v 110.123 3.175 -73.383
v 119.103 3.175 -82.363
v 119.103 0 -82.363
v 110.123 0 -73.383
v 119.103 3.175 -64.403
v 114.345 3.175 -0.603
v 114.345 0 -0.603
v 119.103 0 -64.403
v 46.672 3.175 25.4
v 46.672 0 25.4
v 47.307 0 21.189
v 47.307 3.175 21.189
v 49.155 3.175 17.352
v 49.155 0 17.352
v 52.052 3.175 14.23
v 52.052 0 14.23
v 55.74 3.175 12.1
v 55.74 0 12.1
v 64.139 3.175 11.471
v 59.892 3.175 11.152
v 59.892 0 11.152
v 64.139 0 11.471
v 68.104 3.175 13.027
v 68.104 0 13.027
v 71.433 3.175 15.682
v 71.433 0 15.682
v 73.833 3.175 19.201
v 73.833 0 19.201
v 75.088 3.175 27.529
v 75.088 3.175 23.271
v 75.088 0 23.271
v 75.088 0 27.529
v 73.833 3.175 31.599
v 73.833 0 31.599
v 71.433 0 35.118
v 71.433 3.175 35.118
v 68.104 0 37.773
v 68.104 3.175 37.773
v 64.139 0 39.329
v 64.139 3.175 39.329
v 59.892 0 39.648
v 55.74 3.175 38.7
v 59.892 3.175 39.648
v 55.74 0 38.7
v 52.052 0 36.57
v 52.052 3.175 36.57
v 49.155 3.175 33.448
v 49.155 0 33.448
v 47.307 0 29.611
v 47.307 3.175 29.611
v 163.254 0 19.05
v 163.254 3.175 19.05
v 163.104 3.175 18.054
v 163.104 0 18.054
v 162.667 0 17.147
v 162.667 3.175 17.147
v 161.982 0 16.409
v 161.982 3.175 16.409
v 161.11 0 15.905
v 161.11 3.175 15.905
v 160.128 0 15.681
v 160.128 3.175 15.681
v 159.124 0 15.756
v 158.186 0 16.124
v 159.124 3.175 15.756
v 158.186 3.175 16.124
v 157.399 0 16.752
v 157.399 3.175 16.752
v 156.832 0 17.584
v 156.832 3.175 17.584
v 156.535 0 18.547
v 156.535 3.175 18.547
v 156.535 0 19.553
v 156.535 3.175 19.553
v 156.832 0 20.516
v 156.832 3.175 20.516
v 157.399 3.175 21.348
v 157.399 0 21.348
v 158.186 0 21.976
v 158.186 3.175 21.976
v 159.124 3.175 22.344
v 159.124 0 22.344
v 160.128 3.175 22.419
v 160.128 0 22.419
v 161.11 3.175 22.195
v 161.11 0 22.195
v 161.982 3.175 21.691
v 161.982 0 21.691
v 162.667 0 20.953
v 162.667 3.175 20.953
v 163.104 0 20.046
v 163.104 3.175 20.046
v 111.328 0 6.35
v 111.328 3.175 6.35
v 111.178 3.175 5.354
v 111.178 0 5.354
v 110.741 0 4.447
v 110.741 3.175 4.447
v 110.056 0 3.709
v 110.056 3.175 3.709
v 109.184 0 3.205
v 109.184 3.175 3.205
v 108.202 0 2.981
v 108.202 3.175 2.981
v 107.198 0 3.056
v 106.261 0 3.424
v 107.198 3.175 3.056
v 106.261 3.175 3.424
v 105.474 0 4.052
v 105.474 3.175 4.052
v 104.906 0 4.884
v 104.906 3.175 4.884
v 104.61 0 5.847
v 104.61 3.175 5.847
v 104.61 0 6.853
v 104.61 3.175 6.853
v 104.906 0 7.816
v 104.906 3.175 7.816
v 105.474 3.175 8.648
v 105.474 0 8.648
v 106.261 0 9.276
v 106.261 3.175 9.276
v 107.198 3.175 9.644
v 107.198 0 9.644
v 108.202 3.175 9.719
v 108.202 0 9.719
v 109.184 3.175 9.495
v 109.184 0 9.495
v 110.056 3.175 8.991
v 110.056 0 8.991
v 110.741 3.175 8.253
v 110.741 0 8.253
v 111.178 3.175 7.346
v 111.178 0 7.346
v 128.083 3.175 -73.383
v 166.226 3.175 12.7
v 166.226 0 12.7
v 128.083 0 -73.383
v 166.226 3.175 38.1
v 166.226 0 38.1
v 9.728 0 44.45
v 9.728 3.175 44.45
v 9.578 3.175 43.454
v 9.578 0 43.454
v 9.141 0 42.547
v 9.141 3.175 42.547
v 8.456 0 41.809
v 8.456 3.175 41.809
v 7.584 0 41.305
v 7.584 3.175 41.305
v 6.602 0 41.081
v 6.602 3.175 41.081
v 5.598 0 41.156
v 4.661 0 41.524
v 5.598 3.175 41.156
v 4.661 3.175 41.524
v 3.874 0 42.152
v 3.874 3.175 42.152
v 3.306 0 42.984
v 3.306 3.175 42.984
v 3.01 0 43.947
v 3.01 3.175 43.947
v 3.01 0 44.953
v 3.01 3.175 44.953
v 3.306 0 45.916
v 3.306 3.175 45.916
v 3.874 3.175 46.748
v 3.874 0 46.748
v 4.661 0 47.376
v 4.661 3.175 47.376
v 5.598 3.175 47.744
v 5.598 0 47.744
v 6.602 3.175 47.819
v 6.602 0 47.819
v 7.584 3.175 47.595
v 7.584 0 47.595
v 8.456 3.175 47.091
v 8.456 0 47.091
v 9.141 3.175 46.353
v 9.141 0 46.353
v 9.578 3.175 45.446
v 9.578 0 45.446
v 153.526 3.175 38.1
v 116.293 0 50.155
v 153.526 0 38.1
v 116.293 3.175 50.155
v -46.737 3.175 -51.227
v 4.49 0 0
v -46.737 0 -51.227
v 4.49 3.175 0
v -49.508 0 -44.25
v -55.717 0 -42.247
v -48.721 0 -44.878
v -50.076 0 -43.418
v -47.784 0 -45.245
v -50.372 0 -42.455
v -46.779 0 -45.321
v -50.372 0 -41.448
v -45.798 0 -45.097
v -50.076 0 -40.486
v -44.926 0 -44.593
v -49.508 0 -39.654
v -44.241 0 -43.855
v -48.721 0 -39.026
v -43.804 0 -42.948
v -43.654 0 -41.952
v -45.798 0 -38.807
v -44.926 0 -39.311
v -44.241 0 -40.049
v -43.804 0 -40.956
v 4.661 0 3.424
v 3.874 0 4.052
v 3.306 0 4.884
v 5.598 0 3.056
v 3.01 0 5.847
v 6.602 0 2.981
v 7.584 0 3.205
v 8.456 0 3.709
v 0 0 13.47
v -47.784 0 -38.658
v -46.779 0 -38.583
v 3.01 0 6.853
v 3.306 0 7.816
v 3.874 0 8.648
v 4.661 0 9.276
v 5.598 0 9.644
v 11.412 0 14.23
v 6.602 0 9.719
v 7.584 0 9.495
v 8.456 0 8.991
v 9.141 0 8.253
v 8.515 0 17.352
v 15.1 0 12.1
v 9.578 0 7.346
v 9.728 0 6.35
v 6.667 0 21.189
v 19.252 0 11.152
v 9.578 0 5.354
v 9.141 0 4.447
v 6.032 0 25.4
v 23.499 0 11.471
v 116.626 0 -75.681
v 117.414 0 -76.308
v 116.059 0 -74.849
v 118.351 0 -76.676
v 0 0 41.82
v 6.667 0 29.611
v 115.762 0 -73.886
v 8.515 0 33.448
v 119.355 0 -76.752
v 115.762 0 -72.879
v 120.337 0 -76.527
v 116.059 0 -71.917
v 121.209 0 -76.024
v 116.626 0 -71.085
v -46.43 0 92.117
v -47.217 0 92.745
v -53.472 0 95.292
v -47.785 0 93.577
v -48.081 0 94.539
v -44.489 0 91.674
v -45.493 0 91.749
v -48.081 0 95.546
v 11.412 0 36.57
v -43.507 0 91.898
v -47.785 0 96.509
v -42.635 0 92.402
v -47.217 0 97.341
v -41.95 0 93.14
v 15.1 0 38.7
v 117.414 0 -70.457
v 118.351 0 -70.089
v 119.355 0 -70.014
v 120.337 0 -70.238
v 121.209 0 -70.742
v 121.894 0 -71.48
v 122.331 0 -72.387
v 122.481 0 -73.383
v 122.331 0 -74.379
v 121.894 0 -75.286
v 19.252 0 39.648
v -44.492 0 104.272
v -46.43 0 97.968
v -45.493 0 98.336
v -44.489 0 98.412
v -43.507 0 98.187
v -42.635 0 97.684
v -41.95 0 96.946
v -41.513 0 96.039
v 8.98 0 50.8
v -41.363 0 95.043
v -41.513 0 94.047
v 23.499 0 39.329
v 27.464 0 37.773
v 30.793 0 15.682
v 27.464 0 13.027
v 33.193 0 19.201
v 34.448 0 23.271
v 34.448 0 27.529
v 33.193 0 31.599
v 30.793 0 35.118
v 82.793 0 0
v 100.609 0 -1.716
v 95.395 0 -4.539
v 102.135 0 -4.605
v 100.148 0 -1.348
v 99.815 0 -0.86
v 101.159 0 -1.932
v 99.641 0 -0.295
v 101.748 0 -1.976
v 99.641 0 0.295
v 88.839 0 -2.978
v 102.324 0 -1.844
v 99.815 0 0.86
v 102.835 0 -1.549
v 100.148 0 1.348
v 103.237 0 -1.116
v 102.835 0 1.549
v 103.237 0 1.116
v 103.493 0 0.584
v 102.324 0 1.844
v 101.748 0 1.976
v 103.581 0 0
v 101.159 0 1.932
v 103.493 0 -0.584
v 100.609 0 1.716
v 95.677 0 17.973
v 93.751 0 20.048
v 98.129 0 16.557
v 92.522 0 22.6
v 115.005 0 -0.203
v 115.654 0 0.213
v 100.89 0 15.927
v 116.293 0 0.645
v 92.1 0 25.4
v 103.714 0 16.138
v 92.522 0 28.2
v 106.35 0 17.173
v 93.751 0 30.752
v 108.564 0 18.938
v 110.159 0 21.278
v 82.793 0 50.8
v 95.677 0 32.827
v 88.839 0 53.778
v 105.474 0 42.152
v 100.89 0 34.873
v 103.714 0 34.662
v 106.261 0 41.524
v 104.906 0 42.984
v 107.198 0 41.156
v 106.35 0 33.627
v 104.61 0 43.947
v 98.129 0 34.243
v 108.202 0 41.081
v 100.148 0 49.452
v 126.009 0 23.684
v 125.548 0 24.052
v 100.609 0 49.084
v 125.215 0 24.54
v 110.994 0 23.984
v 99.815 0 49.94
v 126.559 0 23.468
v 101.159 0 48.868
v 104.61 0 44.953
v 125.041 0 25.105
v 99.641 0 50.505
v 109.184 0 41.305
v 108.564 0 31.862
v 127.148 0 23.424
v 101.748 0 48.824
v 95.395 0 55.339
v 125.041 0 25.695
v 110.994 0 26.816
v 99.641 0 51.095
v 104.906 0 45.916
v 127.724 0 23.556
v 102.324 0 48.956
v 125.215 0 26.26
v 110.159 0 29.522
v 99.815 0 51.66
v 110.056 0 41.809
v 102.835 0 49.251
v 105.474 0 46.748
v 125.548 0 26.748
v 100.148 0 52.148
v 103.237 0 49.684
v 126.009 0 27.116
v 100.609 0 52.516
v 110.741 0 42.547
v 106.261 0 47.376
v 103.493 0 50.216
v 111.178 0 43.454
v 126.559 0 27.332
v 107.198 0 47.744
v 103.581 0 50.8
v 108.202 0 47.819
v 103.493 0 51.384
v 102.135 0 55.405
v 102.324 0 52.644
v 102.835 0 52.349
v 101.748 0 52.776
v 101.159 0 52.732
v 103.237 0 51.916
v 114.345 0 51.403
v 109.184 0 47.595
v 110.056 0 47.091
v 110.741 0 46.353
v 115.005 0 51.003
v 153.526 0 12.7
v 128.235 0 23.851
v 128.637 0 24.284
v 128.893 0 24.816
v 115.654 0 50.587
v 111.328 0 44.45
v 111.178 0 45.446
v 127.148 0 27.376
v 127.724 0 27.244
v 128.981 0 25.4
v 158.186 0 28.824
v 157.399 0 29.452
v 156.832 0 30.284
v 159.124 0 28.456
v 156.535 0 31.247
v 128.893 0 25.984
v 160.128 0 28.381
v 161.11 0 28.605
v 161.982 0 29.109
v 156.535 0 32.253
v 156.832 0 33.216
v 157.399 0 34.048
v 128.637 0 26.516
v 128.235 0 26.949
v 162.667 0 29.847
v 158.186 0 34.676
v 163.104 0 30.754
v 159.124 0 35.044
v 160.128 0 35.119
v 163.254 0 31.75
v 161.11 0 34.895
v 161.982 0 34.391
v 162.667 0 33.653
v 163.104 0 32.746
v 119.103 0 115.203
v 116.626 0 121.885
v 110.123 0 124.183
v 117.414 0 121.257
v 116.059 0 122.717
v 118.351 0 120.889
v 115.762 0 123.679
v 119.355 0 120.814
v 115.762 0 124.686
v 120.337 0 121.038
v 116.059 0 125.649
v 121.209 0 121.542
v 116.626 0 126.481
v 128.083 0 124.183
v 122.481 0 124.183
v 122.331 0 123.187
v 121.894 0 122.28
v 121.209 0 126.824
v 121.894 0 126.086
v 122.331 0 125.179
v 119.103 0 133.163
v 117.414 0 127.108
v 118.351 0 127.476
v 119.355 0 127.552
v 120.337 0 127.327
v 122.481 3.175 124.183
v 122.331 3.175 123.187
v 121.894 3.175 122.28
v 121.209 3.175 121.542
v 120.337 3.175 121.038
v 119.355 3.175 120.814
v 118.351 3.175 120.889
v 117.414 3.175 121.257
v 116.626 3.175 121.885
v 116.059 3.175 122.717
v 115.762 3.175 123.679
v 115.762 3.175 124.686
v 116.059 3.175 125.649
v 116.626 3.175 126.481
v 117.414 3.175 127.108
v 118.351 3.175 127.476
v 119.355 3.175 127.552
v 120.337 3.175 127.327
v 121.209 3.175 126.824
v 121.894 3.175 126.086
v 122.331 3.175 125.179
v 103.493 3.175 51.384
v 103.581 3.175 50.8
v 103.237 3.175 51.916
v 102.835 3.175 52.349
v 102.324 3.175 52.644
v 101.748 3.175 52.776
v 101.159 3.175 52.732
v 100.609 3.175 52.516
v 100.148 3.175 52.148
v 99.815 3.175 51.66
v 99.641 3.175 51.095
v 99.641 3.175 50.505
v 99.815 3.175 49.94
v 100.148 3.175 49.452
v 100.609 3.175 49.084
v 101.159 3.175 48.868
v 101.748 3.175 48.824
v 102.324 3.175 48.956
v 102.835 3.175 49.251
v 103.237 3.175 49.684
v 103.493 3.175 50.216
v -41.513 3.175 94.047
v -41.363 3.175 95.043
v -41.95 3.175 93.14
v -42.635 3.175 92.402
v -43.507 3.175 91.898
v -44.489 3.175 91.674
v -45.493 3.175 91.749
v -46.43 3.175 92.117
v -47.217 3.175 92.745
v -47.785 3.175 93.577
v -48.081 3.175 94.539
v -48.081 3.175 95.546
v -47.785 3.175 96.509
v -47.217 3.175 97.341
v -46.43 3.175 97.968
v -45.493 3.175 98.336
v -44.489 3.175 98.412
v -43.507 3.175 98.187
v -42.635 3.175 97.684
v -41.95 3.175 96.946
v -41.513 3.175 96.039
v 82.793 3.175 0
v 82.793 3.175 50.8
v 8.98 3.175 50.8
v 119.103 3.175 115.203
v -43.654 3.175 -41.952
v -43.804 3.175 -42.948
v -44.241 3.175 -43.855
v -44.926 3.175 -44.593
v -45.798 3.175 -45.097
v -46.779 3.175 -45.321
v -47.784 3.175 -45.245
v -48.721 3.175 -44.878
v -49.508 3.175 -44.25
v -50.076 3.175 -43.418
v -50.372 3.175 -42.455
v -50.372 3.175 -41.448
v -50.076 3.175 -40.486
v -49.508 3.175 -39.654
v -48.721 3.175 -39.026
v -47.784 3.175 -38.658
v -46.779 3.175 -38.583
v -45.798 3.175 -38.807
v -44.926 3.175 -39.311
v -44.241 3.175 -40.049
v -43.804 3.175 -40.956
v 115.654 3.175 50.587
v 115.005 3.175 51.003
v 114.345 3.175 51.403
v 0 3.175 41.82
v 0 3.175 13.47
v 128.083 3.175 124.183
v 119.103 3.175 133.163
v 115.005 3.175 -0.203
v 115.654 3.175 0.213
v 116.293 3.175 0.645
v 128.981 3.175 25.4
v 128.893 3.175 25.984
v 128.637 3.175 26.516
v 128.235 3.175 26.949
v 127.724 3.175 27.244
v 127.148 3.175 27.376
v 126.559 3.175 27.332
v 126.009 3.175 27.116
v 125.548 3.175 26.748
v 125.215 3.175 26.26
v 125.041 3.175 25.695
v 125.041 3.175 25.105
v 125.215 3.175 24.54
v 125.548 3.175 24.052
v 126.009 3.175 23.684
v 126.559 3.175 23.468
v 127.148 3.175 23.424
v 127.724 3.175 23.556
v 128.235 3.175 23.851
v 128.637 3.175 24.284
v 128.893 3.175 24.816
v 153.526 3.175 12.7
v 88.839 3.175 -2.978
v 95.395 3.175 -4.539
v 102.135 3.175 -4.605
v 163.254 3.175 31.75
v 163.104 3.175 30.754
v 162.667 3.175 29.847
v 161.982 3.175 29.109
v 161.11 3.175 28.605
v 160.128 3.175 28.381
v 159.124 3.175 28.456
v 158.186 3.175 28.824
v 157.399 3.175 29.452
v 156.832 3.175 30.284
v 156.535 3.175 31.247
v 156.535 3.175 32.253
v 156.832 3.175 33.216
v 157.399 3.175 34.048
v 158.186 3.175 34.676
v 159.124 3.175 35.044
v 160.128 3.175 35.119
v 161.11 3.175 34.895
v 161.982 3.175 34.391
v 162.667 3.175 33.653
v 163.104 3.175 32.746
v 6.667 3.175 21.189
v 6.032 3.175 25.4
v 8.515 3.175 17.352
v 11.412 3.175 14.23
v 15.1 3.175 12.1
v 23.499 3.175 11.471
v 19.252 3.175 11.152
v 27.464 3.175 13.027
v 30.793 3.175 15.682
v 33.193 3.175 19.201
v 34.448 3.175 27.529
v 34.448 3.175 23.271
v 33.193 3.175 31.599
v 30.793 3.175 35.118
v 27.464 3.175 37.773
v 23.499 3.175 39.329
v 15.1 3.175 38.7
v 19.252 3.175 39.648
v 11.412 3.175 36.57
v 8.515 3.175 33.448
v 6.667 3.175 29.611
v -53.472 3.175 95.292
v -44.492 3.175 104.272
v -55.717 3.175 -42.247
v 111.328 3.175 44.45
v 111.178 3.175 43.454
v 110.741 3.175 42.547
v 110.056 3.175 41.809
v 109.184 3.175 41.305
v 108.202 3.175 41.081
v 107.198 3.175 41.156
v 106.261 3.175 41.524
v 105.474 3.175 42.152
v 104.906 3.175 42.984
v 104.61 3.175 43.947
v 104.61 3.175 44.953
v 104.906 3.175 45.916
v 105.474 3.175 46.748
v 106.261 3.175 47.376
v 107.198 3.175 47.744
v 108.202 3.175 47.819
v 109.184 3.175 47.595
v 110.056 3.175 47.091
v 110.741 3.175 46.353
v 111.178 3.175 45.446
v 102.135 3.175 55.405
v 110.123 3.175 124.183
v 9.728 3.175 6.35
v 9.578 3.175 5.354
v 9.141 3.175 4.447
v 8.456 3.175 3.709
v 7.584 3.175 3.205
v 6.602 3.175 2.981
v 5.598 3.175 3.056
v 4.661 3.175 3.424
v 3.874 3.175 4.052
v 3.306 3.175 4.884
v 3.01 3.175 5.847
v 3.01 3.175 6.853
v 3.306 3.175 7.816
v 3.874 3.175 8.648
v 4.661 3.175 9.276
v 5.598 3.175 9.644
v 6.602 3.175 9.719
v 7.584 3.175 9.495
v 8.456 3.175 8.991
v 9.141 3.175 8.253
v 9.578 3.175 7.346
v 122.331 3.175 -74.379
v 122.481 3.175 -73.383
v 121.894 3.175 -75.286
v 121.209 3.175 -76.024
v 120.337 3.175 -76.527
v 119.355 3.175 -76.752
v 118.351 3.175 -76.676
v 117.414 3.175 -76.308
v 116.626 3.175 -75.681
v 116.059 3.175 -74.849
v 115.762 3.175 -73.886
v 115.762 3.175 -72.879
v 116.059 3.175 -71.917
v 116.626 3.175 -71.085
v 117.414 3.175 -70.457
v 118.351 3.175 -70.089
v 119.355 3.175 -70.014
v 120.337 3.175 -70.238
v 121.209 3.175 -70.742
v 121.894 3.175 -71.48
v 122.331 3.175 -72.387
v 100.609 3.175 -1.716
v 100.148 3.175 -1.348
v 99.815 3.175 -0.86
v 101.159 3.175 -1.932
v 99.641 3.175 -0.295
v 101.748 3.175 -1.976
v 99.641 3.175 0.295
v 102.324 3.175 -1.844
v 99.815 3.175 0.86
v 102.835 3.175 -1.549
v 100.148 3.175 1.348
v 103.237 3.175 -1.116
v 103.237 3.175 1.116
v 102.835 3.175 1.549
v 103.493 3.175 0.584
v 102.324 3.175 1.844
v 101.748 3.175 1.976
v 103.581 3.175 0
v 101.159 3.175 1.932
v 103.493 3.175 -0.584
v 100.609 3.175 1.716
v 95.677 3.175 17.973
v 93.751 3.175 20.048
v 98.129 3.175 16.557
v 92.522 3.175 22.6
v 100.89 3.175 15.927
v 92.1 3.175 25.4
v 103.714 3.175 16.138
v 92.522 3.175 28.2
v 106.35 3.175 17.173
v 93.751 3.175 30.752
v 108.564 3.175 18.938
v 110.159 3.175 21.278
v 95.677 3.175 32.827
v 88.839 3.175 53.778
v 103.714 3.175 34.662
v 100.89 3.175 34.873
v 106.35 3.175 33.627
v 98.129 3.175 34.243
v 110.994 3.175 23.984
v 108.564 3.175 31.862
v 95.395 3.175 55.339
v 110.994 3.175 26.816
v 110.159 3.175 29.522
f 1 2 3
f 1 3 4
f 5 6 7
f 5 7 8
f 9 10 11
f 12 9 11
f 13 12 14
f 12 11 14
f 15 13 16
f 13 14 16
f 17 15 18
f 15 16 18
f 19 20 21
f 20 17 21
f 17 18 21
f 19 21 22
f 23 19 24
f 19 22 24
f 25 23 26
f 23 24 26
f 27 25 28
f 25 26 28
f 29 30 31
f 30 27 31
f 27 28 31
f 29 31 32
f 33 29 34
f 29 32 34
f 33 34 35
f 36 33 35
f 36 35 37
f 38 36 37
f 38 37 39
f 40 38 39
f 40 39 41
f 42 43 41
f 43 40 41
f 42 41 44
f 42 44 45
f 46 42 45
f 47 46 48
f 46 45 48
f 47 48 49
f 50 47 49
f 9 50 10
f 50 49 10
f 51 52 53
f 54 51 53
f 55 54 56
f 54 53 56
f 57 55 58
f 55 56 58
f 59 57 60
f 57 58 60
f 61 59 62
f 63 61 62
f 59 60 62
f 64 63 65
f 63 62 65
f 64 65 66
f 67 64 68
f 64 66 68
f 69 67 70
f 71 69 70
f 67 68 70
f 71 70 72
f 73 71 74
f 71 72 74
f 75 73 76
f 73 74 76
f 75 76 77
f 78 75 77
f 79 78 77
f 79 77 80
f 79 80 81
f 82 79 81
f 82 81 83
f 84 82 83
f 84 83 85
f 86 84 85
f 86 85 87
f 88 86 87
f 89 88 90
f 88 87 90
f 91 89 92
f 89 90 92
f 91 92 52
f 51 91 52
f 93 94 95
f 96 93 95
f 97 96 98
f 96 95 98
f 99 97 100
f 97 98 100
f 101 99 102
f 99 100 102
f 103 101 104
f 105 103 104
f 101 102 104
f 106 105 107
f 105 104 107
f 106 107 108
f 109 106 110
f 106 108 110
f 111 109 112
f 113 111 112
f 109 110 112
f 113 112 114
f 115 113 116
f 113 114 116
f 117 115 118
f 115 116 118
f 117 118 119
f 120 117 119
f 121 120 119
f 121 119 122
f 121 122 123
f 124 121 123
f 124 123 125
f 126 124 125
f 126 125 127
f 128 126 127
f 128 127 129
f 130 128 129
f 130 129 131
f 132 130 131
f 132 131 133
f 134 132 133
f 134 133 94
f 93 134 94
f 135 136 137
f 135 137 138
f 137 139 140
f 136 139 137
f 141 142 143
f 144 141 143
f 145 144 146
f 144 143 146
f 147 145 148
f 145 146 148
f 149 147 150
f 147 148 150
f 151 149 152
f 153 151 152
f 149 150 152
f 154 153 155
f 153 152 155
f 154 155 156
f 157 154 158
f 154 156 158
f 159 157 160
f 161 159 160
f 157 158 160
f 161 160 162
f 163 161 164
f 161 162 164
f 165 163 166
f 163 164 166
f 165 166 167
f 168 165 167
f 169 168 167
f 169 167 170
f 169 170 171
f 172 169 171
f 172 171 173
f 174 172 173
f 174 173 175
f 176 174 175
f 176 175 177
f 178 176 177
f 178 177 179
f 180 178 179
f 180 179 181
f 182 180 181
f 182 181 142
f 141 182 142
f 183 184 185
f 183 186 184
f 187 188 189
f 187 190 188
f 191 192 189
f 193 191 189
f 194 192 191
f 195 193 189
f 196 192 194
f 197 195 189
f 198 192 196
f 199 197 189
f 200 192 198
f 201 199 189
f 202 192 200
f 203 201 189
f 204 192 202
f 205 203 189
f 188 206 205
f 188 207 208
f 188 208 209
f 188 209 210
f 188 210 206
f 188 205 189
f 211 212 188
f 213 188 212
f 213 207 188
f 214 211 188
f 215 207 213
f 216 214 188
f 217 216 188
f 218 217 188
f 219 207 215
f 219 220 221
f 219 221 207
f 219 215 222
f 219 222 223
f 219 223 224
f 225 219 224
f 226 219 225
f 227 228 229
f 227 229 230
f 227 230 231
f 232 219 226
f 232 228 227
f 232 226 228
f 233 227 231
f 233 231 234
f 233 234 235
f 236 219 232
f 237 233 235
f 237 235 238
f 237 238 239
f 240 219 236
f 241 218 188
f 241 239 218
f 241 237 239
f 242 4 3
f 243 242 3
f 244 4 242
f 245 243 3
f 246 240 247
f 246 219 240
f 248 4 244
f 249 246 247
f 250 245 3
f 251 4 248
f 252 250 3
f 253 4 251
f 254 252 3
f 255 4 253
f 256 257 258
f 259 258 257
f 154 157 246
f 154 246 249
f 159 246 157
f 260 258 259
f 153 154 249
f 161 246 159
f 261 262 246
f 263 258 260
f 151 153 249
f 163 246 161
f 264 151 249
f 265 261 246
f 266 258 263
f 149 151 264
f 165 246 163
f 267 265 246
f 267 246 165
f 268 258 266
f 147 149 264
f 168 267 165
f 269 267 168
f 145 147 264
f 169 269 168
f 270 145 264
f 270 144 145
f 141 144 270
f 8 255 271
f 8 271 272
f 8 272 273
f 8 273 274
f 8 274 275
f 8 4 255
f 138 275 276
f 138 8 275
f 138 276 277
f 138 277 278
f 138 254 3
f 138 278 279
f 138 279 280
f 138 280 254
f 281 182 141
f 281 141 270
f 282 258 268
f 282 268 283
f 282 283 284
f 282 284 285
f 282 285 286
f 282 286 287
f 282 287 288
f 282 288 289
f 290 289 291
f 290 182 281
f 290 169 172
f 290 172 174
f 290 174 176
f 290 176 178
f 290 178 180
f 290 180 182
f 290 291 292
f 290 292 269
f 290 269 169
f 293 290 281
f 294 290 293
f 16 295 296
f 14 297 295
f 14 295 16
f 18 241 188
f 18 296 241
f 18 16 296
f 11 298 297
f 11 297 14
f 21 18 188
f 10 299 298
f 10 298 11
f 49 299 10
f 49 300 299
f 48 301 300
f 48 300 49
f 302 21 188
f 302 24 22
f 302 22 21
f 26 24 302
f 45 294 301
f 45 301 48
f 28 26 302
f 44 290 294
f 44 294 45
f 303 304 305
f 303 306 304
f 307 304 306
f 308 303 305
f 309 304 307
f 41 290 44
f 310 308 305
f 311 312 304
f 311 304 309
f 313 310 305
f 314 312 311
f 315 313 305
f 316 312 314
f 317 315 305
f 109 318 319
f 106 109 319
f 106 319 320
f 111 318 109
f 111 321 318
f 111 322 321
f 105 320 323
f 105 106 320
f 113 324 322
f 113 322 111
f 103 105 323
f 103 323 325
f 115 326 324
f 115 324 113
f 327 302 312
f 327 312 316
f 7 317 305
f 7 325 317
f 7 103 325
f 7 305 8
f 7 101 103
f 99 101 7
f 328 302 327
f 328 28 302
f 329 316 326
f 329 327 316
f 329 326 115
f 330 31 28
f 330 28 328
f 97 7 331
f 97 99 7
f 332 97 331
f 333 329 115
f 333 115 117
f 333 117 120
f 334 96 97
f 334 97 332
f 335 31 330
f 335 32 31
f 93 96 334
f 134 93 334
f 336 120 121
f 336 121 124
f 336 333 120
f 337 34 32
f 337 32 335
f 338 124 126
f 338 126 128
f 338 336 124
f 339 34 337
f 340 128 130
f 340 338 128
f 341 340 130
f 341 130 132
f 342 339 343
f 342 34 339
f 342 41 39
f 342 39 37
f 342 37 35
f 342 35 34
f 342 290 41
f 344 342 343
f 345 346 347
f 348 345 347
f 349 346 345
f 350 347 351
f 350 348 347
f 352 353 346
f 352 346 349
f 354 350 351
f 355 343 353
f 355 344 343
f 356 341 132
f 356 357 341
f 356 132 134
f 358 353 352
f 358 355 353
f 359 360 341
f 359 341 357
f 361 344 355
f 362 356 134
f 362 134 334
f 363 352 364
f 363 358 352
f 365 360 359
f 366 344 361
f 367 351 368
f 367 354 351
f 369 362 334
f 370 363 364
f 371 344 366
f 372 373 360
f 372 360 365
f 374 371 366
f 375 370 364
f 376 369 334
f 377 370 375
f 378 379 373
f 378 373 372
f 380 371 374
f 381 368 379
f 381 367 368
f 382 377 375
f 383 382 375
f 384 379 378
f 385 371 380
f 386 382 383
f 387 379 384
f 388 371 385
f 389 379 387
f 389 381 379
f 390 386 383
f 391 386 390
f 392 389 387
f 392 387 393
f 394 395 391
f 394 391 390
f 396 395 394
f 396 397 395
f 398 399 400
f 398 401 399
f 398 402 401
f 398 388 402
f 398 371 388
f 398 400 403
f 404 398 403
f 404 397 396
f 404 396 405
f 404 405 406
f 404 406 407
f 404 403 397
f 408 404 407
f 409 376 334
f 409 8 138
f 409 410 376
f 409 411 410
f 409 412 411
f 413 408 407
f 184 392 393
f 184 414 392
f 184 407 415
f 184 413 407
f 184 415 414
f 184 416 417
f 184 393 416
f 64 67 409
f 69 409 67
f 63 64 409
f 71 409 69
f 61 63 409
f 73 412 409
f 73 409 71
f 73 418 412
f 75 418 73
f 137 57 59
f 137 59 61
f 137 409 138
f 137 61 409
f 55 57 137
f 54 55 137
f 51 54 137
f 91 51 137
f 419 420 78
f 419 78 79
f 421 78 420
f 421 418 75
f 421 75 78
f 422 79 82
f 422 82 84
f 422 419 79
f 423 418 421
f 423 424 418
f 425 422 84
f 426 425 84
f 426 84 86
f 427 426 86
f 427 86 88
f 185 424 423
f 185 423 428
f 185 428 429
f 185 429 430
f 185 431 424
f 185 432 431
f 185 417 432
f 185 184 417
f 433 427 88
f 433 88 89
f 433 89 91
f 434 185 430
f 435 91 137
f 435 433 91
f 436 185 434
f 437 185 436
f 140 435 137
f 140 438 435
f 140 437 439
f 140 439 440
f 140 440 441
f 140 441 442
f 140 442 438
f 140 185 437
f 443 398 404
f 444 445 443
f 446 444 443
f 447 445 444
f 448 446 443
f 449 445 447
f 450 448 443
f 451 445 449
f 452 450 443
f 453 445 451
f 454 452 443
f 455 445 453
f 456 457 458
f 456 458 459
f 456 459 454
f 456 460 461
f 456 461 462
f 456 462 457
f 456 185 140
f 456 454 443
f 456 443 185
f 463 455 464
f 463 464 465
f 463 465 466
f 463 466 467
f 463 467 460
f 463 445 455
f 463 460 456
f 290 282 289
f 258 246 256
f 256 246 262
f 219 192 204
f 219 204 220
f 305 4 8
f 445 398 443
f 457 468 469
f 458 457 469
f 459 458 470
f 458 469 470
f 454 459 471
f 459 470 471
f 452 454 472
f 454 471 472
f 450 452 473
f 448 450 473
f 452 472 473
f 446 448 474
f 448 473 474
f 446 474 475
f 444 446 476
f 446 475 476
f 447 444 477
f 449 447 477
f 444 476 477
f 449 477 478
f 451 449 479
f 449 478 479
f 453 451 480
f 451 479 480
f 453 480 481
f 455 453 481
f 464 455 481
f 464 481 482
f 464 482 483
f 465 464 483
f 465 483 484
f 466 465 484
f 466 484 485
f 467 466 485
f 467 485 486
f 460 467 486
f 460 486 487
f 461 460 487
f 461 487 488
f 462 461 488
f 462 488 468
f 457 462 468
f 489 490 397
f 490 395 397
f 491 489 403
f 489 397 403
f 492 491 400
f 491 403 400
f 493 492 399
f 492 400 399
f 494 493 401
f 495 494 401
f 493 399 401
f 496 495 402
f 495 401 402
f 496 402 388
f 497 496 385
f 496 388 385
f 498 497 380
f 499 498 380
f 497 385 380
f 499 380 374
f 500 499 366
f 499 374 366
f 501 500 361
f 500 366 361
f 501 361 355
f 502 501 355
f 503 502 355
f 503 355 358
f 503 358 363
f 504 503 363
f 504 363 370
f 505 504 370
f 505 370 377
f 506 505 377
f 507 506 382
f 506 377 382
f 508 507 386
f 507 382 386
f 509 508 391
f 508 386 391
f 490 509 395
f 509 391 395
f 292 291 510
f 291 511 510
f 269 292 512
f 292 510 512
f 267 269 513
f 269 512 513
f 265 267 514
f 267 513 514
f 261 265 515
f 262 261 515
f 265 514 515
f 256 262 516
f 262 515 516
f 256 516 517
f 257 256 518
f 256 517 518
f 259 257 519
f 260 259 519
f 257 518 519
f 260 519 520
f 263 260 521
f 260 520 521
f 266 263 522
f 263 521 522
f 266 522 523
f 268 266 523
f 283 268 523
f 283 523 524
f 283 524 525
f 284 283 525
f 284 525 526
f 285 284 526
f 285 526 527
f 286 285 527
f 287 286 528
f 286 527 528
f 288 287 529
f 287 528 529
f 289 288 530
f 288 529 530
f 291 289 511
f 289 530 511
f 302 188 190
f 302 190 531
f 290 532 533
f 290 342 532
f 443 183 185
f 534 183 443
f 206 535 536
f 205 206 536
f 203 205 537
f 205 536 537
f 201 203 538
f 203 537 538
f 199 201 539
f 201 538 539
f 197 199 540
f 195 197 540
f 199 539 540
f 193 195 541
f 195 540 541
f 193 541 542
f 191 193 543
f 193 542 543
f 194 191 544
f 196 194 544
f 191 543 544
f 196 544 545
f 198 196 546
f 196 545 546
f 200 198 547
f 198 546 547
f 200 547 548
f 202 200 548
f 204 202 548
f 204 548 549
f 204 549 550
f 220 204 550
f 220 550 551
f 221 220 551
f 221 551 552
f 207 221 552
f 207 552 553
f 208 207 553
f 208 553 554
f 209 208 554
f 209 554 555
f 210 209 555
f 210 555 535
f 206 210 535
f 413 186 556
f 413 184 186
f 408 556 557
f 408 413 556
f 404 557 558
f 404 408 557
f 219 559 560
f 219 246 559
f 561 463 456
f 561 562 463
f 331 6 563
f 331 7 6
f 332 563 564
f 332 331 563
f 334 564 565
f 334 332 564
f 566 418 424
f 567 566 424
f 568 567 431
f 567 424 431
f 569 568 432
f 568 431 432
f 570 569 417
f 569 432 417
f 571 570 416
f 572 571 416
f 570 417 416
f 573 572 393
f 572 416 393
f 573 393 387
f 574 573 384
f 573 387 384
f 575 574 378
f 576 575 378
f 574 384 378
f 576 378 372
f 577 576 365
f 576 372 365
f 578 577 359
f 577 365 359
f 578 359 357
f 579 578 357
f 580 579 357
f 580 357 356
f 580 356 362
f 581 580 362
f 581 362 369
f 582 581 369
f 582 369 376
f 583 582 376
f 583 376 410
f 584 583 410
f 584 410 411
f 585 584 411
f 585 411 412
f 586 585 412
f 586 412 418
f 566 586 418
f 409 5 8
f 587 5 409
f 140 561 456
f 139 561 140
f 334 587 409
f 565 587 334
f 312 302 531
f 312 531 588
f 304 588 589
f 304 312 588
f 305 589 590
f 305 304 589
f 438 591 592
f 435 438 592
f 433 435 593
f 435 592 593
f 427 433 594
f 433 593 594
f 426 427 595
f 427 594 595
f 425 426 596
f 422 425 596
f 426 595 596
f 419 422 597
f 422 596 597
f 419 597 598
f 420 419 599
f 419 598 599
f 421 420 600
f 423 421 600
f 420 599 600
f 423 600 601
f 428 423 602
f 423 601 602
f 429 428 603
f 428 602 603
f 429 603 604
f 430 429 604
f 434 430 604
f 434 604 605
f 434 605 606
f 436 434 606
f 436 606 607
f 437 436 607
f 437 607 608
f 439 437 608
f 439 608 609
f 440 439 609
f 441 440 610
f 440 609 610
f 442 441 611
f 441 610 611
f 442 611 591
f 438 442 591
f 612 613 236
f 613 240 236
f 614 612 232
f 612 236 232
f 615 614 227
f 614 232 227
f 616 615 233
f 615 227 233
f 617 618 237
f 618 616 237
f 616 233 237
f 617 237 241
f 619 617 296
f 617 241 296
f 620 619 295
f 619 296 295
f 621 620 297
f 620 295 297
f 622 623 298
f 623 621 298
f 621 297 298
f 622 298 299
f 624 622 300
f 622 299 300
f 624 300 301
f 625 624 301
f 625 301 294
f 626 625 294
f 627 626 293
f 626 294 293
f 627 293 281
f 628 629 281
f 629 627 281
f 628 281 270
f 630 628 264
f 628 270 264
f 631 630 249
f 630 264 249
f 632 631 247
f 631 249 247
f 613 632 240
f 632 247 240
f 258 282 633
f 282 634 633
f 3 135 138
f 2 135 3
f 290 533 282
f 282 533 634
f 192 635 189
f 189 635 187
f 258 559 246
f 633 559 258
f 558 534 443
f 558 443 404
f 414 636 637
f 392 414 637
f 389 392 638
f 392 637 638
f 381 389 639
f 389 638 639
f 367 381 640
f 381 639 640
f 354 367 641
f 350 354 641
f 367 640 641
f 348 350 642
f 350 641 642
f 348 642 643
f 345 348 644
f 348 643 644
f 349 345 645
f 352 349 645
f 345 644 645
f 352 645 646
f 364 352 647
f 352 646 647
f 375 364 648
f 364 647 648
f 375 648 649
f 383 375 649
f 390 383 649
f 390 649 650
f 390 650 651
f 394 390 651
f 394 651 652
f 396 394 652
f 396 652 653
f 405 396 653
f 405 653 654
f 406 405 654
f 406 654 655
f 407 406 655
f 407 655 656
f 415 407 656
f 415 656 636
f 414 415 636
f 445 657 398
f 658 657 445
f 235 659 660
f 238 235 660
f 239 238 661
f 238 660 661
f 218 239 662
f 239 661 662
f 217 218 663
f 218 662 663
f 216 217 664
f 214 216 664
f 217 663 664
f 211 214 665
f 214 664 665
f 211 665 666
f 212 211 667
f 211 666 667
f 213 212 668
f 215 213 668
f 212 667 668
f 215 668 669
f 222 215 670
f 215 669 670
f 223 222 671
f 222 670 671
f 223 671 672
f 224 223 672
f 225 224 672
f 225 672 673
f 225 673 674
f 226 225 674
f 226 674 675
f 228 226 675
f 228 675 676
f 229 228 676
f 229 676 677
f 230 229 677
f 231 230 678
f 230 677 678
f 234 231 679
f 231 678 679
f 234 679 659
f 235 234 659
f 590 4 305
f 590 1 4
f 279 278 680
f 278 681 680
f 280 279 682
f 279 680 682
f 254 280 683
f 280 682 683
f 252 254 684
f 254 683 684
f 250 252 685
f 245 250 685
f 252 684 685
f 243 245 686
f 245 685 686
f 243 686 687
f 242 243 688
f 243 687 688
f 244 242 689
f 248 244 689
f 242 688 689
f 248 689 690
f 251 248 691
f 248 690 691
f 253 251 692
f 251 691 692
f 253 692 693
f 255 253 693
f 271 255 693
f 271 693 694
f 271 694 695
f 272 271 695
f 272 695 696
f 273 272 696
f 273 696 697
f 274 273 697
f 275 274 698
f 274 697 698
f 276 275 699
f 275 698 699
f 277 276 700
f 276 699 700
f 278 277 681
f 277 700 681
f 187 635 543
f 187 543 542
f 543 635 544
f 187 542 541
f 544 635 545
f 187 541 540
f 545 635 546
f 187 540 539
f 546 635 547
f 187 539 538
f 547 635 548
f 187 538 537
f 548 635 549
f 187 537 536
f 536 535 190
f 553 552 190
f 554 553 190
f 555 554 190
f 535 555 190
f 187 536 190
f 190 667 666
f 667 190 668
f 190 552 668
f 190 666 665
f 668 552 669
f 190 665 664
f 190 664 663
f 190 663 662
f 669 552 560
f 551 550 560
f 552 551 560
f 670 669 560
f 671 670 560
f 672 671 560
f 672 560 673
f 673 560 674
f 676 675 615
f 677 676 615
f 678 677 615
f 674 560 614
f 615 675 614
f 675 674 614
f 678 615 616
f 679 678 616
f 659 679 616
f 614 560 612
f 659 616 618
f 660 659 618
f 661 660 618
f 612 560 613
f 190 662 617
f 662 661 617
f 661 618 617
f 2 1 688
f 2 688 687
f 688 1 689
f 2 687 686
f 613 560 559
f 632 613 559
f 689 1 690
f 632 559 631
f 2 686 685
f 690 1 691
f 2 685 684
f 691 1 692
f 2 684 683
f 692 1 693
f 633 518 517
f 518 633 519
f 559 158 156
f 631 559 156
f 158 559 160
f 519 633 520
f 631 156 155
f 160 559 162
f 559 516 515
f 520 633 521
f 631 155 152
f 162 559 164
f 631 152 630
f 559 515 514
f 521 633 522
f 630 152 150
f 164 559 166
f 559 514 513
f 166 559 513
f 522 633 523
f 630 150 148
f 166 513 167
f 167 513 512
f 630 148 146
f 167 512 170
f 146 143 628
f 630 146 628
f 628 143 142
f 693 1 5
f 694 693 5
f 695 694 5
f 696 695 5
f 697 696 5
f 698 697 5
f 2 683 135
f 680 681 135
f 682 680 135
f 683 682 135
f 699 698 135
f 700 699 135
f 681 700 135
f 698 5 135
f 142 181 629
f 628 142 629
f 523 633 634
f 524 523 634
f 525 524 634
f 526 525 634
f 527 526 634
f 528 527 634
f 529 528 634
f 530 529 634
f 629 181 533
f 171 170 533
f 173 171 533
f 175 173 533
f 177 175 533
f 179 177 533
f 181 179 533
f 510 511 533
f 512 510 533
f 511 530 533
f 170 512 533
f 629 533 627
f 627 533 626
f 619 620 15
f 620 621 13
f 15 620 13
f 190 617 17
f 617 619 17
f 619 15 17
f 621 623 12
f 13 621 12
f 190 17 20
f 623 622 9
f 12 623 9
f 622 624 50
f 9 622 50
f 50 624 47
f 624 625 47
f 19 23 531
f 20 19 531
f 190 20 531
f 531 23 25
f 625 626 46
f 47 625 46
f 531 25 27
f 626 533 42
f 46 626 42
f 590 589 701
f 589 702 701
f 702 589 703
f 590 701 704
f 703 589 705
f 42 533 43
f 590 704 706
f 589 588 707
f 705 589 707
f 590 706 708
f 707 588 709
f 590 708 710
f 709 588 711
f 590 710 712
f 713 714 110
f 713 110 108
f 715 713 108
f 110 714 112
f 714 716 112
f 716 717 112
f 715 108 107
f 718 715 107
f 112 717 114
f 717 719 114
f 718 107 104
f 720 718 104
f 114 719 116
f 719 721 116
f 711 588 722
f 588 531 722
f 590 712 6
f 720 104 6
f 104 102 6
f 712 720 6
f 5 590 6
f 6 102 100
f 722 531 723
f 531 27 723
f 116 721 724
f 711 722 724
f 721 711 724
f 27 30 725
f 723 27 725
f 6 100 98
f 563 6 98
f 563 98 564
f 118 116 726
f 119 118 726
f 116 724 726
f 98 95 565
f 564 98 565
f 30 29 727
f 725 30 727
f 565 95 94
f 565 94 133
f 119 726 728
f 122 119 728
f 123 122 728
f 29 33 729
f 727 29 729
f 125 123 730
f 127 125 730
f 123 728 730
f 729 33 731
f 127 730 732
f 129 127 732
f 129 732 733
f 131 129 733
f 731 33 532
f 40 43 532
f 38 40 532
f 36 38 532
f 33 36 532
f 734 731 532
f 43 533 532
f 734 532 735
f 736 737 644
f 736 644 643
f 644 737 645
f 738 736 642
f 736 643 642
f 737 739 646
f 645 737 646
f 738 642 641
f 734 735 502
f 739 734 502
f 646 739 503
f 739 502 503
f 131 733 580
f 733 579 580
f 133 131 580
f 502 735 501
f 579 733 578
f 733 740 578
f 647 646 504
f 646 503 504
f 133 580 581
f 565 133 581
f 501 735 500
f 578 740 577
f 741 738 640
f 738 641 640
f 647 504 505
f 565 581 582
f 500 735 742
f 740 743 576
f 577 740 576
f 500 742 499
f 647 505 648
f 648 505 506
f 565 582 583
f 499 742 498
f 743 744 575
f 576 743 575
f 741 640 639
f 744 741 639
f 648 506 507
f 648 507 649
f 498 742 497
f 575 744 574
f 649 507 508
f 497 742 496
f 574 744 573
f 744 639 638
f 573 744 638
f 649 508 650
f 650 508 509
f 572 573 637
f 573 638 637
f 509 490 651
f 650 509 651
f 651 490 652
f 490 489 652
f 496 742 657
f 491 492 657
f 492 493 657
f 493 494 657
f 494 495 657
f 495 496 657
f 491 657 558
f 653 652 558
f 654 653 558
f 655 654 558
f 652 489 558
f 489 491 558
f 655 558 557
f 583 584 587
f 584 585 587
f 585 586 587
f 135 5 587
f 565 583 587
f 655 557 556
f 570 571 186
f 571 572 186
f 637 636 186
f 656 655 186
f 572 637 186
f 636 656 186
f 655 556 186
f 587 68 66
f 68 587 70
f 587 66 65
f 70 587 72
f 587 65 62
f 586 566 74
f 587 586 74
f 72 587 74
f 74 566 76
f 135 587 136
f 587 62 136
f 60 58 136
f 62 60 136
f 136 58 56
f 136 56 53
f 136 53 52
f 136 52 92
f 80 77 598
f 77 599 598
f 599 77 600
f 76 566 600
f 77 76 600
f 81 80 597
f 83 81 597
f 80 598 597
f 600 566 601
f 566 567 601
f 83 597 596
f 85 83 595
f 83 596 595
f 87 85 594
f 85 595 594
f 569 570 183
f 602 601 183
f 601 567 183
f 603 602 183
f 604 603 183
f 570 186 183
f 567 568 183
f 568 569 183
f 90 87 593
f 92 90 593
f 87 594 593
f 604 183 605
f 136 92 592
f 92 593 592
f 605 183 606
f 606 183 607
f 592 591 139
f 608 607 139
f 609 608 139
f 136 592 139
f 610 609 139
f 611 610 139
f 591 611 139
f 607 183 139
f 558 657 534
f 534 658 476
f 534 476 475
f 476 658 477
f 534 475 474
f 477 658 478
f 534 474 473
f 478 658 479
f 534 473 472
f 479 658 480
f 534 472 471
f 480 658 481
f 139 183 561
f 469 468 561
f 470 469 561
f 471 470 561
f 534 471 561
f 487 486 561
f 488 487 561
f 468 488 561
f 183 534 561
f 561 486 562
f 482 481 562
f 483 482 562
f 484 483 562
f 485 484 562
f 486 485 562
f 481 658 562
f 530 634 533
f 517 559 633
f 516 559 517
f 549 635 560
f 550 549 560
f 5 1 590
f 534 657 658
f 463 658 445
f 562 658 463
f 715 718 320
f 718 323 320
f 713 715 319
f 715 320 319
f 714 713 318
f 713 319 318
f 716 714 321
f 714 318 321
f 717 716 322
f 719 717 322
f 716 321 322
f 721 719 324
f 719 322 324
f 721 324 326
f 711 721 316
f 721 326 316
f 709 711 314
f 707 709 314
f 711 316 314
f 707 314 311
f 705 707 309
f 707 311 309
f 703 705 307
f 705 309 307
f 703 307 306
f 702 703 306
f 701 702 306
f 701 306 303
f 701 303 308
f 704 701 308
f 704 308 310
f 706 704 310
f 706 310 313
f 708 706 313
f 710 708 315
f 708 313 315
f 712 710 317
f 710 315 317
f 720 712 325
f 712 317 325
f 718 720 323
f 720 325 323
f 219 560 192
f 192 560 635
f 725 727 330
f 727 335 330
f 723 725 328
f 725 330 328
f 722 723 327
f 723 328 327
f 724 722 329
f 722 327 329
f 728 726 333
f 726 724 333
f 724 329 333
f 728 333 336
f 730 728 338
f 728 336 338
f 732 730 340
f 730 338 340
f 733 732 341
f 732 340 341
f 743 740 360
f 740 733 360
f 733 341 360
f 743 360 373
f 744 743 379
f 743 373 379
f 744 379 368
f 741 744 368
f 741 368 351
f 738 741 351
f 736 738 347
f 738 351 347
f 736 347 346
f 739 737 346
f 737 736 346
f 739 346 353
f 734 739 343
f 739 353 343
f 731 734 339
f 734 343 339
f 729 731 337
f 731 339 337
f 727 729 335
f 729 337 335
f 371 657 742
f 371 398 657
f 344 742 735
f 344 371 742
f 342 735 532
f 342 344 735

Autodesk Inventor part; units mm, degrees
ref_plane "YZ Plane" through (0, 0, 0) normal (1, 0, 0) x (0, 1, 0)
ref_plane "XZ Plane" through (0, 0, 0) normal (0, 1, 0) x (-1, 0, 0)
ref_plane "XY Plane" through (0, 0, 0) normal (0, 0, 1) x (1, 0, 0)
sketch "Sketch1" plane through (0, 0, 0) normal (0, 1, 0) x (-1, 0, 0)
  line L0 (0, 0) -> (-114.3, 0)
  line L1 (-114.3, 0) -> (-114.3, 50.8)
  line L2 (-114.3, 50.8) -> (0, 50.8)
  line L3 (0, 50.8) -> (0, 0)
  circle A0 centre (-101.6, 25.4) radius 9.5
  circle A1 centre (-60.96, 25.4) radius 14.2875
  circle A2 centre (-20.32, 25.4) radius 14.2875
  dimension "d3" = 50.8
  dimension "d4" = 19
  dimension "d12" = 28.575
  dimension "d13" = 40.64
  dimension "d14" = 114.3
  dimension "d15" = 28.575
  dimension "d16" = 40.64
  dimension "d56" = 20.32
  dimension "d57" = 25.4
  dimension "d58" = 25.4
  dimension "d59" = 25.4
extrude "Extrusion3" add sketch "Sketch1" along normal blind 3.175
sketch "Sketch2" plane through (0, 3.175, 0) normal (0, 1, 0) x (1, 0, 0)
  line L0 (114.3, 0) -> (0, 0) projected
  line L1 (0, -50.8) -> (114.3, -50.8) projected
  line L2 (114.3, -50.8) -> (114.3, 0) projected
  circle A0 centre (107.95, -6.35) radius 3.3782
  circle A1 centre (107.95, -44.45) radius 3.3782
  dimension "d19" = 6.7564
  dimension "d20" = 6.7564
  dimension "d21" = 6.35
  dimension "d22" = 6.35
  dimension "d23" = 6.35
  dimension "d24" = 6.35
extrude "Extrusion4" cut sketch "Sketch2" against normal blind 25.4
sketch "Sketch3" plane through (0, 3.175, 0) normal (0, 1, 0) x (1, 0, 0)
  line L0 (114.3, 0) -> (0, 0) projected
  line L1 (0, 0) -> (0, -50.8) projected
  line L2 (0, -50.8) -> (114.3, -50.8) projected
  circle A0 centre (6.35, -6.35) radius 3.3782
  circle A1 centre (6.35, -44.45) radius 3.3782
  dimension "d27" = 6.7564
  dimension "d28" = 6.7564
  dimension "d29" = 6.35
  dimension "d30" = 6.35
  dimension "d31" = 6.35
  dimension "d32" = 6.35
extrude "Extrusion5" cut sketch "Sketch3" against normal blind 25.4
sketch "Sketch4" plane through (0, 3.175, 0) normal (0, 1, 0) x (1, 0, 0)
  circle A0 centre (6.35, -6.35) radius 3.3782 projected
  circle A1 centre (6.35, -44.45) radius 3.3782 projected
  line L0 (114.3, 0) -> (0, 0) projected
  line L1 (0, 0) -> (0, -50.8) projected
  line L2 (0, -50.8) -> (114.3, -50.8) projected
  line L3 (226.8659, 306.8695) -> (559.1354, -25.4) projected
  line L4 (559.1354, -25.4) -> (226.8659, -357.6695) projected
  line L5 (226.8659, -357.6695) -> (-105.4036, -25.4) projected
  line L6 (-105.4036, -25.4) -> (226.8659, 306.8695) projected
  circle A2 centre (-105.9649, -16.981) radius 3.3782 projected
  circle A3 centre (-97.5459, -8.562) radius 3.3782 projected
  circle A4 centre (-89.1269, -0.143) radius 3.3782 projected
  circle A5 centre (-80.7079, 8.276) radius 3.3782 projected
  circle A6 centre (-72.2889, 16.695) radius 3.3782 projected
  circle A7 centre (-63.8699, 25.1139) radius 3.3782 projected
  circle A8 centre (-55.4509, 33.5329) radius 3.3782 projected
  circle A9 centre (-47.0319, 41.9519) radius 3.3782 projected
  circle A10 centre (-39.2063, 49.7776) radius 3.3782 projected
  circle A11 centre (-31.3806, 57.6032) radius 3.3782 projected
  circle A12 centre (-23.555, 65.4289) radius 3.3782 projected
  circle A13 centre (-15.7293, 73.2545) radius 3.3782 projected
  circle A14 centre (-7.9037, 81.0802) radius 3.3782 projected
  circle A15 centre (-0.078, 88.9058) radius 3.3782 projected
  circle A16 centre (7.7476, 96.7315) radius 3.3782 projected
  circle A17 centre (15.5733, 104.5571) radius 3.3782 projected
  circle A18 centre (23.3989, 112.3828) radius 3.3782 projected
  circle A19 centre (31.2246, 120.2084) radius 3.3782 projected
  circle A20 centre (39.0502, 128.0341) radius 3.3782 projected
  circle A21 centre (46.8759, 135.8597) radius 3.3782 projected
  circle A22 centre (54.7016, 143.6854) radius 3.3782 projected
  circle A23 centre (62.5272, 151.511) radius 3.3782 projected
  circle A24 centre (70.3529, 159.3367) radius 3.3782 projected
  circle A25 centre (78.1785, 167.1623) radius 3.3782 projected
  circle A26 centre (86.0042, 174.988) radius 3.3782 projected
  circle A27 centre (93.8298, 182.8137) radius 3.3782 projected
  circle A28 centre (101.6555, 190.6393) radius 3.3782 projected
  circle A29 centre (109.4811, 198.465) radius 3.3782 projected
  circle A30 centre (117.3068, 206.2906) radius 3.3782 projected
  circle A31 centre (125.1324, 214.1163) radius 3.3782 projected
  circle A32 centre (132.9581, 221.9419) radius 3.3782 projected
  circle A33 centre (140.7837, 229.7676) radius 3.3782 projected
  circle A34 centre (148.6094, 237.5932) radius 3.3782 projected
  circle A35 centre (156.435, 245.4189) radius 3.3782 projected
  circle A36 centre (164.2607, 253.2445) radius 3.3782 projected
  circle A37 centre (172.0863, 261.0702) radius 3.3782 projected
  circle A38 centre (179.912, 268.8958) radius 3.3782 projected
  circle A39 centre (187.7376, 276.7215) radius 3.3782 projected
  circle A40 centre (195.5633, 284.5471) radius 3.3782 projected
  circle A41 centre (203.3889, 292.3728) radius 3.3782 projected
  circle A42 centre (211.2146, 300.1984) radius 3.3782 projected
  circle A43 centre (219.0402, 308.0241) radius 3.3782 projected
  circle A44 centre (226.8659, 315.8497) radius 3.3782 projected
  circle A45 centre (-114.3838, -25.4) radius 3.3782 projected
  circle A46 centre (-107.4196, -32.3643) radius 3.3782 projected
  circle A47 centre (-100.4553, -39.3286) radius 3.3782 projected
  circle A48 centre (-93.491, -46.2928) radius 3.3782 projected
  circle A49 centre (-86.5267, -53.2571) radius 3.3782 projected
  circle A50 centre (-79.5624, -60.2214) radius 3.3782 projected
  circle A51 centre (-72.5982, -67.1857) radius 3.3782 projected
  circle A52 centre (-65.6339, -74.15) radius 3.3782 projected
  circle A53 centre (-58.6696, -81.1142) radius 3.3782 projected
  circle A54 centre (-51.7053, -88.0785) radius 3.3782 projected
  circle A55 centre (-44.741, -95.0428) radius 3.3782 projected
  circle A56 centre (-37.7768, -102.0071) radius 3.3782 projected
  circle A57 centre (-30.8125, -108.9714) radius 3.3782 projected
  circle A58 centre (-23.8482, -115.9356) radius 3.3782 projected
  circle A59 centre (-16.8839, -122.8999) radius 3.3782 projected
  circle A60 centre (-9.9196, -129.8642) radius 3.3782 projected
  circle A61 centre (-2.9554, -136.8285) radius 3.3782 projected
  circle A62 centre (4.0089, -143.7928) radius 3.3782 projected
  circle A63 centre (10.9732, -150.757) radius 3.3782 projected
  circle A64 centre (17.9375, -157.7213) radius 3.3782 projected
  circle A65 centre (24.9018, -164.6856) radius 3.3782 projected
  circle A66 centre (31.866, -171.6499) radius 3.3782 projected
  circle A67 centre (38.8303, -178.6142) radius 3.3782 projected
  circle A68 centre (45.7946, -185.5784) radius 3.3782 projected
  circle A69 centre (52.7589, -192.5427) radius 3.3782 projected
  circle A70 centre (59.7232, -199.507) radius 3.3782 projected
  circle A71 centre (66.6874, -206.4713) radius 3.3782 projected
  circle A72 centre (73.6517, -213.4356) radius 3.3782 projected
  circle A73 centre (80.616, -220.3998) radius 3.3782 projected
  circle A74 centre (87.5803, -227.3641) radius 3.3782 projected
  circle A75 centre (94.5446, -234.3284) radius 3.3782 projected
  circle A76 centre (101.5088, -241.2927) radius 3.3782 projected
  circle A77 centre (108.4731, -248.257) radius 3.3782 projected
  circle A78 centre (115.4374, -255.2212) radius 3.3782 projected
  circle A79 centre (122.4017, -262.1855) radius 3.3782 projected
  circle A80 centre (129.366, -269.1498) radius 3.3782 projected
  circle A81 centre (136.3302, -276.1141) radius 3.3782 projected
  circle A82 centre (143.2945, -283.0784) radius 3.3782 projected
  circle A83 centre (150.2588, -290.0426) radius 3.3782 projected
  circle A84 centre (157.2231, -297.0069) radius 3.3782 projected
  circle A85 centre (164.1874, -303.9712) radius 3.3782 projected
  circle A86 centre (171.1516, -310.9355) radius 3.3782 projected
  circle A87 centre (178.1159, -317.8998) radius 3.3782 projected
  circle A88 centre (185.0802, -324.8641) radius 3.3782 projected
  circle A89 centre (192.0445, -331.8283) radius 3.3782 projected
  circle A90 centre (199.0088, -338.7926) radius 3.3782 projected
  circle A91 centre (205.9731, -345.7569) radius 3.3782 projected
  circle A92 centre (212.9373, -352.7212) radius 3.3782 projected
  circle A93 centre (219.9016, -359.6855) radius 3.3782 projected
  circle A94 centre (302.0435, 240.6722) radius 3.3782 projected
  circle A95 centre (309.8691, 232.8465) radius 3.3782 projected
  circle A96 centre (317.6948, 225.0209) radius 3.3782 projected
  circle A97 centre (325.5204, 217.1952) radius 3.3782 projected
  circle A98 centre (333.3461, 209.3696) radius 3.3782 projected
  circle A99 centre (341.1717, 201.5439) radius 3.3782 projected
  circle A100 centre (348.9974, 193.7182) radius 3.3782 projected
  circle A101 centre (356.823, 185.8926) radius 3.3782 projected
  circle A102 centre (364.6487, 178.0669) radius 3.3782 projected
  circle A103 centre (372.4743, 170.2413) radius 3.3782 projected
  circle A104 centre (380.3, 162.4156) radius 3.3782 projected
  circle A105 centre (388.1256, 154.59) radius 3.3782 projected
  circle A106 centre (395.9513, 146.7643) radius 3.3782 projected
  circle A107 centre (403.7769, 138.9387) radius 3.3782 projected
  circle A108 centre (411.6026, 131.113) radius 3.3782 projected
  circle A109 centre (419.4282, 123.2874) radius 3.3782 projected
  circle A110 centre (427.2539, 115.4617) radius 3.3782 projected
  circle A111 centre (435.0795, 107.6361) radius 3.3782 projected
  circle A112 centre (442.9052, 99.8104) radius 3.3782 projected
  circle A113 centre (450.7308, 91.9848) radius 3.3782 projected
  circle A114 centre (458.5565, 84.1591) radius 3.3782 projected
  circle A115 centre (466.3822, 76.3335) radius 3.3782 projected
  circle A116 centre (474.2078, 68.5078) radius 3.3782 projected
  circle A117 centre (482.0335, 60.6822) radius 3.3782 projected
  circle A118 centre (489.8591, 52.8565) radius 3.3782 projected
  circle A119 centre (497.6848, 45.0309) radius 3.3782 projected
  circle A120 centre (505.5104, 37.2052) radius 3.3782 projected
  circle A121 centre (513.3361, 29.3796) radius 3.3782 projected
  circle A122 centre (521.1617, 21.5539) radius 3.3782 projected
  circle A123 centre (528.9874, 13.7283) radius 3.3782 projected
  circle A124 centre (536.813, 5.9026) radius 3.3782 projected
  circle A125 centre (544.6387, -1.923) radius 3.3782 projected
  circle A126 centre (552.4643, -9.7487) radius 3.3782 projected
  circle A127 centre (560.29, -17.5743) radius 3.3782 projected
  circle A128 centre (568.1156, -25.4) radius 3.3782 projected
  circle A129 centre (560.29, -33.2257) radius 3.3782 projected
  circle A130 centre (552.4643, -41.0513) radius 3.3782 projected
  circle A131 centre (544.6387, -48.877) radius 3.3782 projected
  circle A132 centre (536.813, -56.7026) radius 3.3782 projected
  circle A133 centre (528.9874, -64.5283) radius 3.3782 projected
  circle A134 centre (521.1617, -72.3539) radius 3.3782 projected
  circle A135 centre (513.3361, -80.1796) radius 3.3782 projected
  circle A136 centre (505.5104, -88.0052) radius 3.3782 projected
  circle A137 centre (497.6848, -95.8309) radius 3.3782 projected
  circle A138 centre (489.8591, -103.6565) radius 3.3782 projected
  circle A139 centre (482.0335, -111.4822) radius 3.3782 projected
  circle A140 centre (474.2078, -119.3078) radius 3.3782 projected
  circle A141 centre (466.3822, -127.1335) radius 3.3782 projected
  circle A142 centre (458.5565, -134.9591) radius 3.3782 projected
  circle A143 centre (450.7308, -142.7848) radius 3.3782 projected
  circle A144 centre (442.9052, -150.6104) radius 3.3782 projected
  circle A145 centre (435.0795, -158.4361) radius 3.3782 projected
  circle A146 centre (427.2539, -166.2617) radius 3.3782 projected
  circle A147 centre (419.4282, -174.0874) radius 3.3782 projected
  circle A148 centre (411.6026, -181.913) radius 3.3782 projected
  circle A149 centre (403.7769, -189.7387) radius 3.3782 projected
  circle A150 centre (395.9513, -197.5643) radius 3.3782 projected
  circle A151 centre (388.1256, -205.39) radius 3.3782 projected
  circle A152 centre (380.3, -213.2156) radius 3.3782 projected
  circle A153 centre (372.4743, -221.0413) radius 3.3782 projected
  circle A154 centre (364.6487, -228.8669) radius 3.3782 projected
  circle A155 centre (356.823, -236.6926) radius 3.3782 projected
  circle A156 centre (348.9974, -244.5182) radius 3.3782 projected
  circle A157 centre (341.1717, -252.3439) radius 3.3782 projected
  circle A158 centre (333.3461, -260.1696) radius 3.3782 projected
  circle A159 centre (325.5204, -267.9952) radius 3.3782 projected
  circle A160 centre (317.6948, -275.8209) radius 3.3782 projected
  circle A161 centre (309.8691, -283.6465) radius 3.3782 projected
  circle A162 centre (302.0435, -291.4722) radius 3.3782 projected
  circle A163 centre (287.4826, 255.233) radius 3.3782 projected
  circle A164 centre (274.0122, 268.7034) radius 3.3782 projected
  circle A165 centre (260.5419, 282.1738) radius 3.3782 projected
  circle A166 centre (247.0715, 295.6442) radius 3.3782 projected
  circle A167 centre (233.6011, 309.1145) radius 3.3782 projected
  circle A168 centre (294.2178, 248.4978) radius 3.3782 projected
  circle A169 centre (240.3363, 302.3793) radius 3.3782 projected
  circle A170 centre (253.8067, 288.909) radius 3.3782 projected
  circle A171 centre (267.277, 275.4386) radius 3.3782 projected
  circle A172 centre (280.7474, 261.9682) radius 3.3782 projected
  circle A173 centre (268.9608, -324.5548) radius 3.3782 projected
  circle A174 centre (226.8659, -366.6497) radius 3.3782 projected
  circle A175 centre (235.2849, -358.2307) radius 3.3782 projected
  circle A176 centre (243.7039, -349.8118) radius 3.3782 projected
  circle A177 centre (252.1229, -341.3928) radius 3.3782 projected
  circle A178 centre (260.5419, -332.9738) radius 3.3782 projected
  circle A179 centre (277.3798, -316.1358) radius 3.3782 projected
  circle A180 centre (285.7988, -307.7168) radius 3.3782 projected
  circle A181 centre (294.2178, -299.2978) radius 3.3782 projected
  line L7 (226.8659, -375.63) -> (-123.3641, -25.4) projected
  line L8 (577.0959, -25.4) -> (226.8659, -375.63) projected
  line L9 (226.8659, 324.83) -> (577.0959, -25.4) projected
  line L10 (-123.3641, -25.4) -> (226.8659, 324.83) projected
  line L11 (8.9803, -50.8) -> (-44.4919, -104.2722)
  line L12 (4.4901, 0) -> (-46.737, 51.2271)
  line L13 (0, -41.8197) -> (-53.4722, -95.2919)
  line L14 (0, -13.4704) -> (-55.7172, 42.2469)
  line L15 (-53.4722, -95.2919) -> (-44.4919, -104.2722)
  line L16 (8.9803, -50.8) -> (0, -50.8)
  line L17 (0, -50.8) -> (0, -41.8197)
  line L18 (-55.7172, 42.2469) -> (-46.737, 51.2271)
  line L19 (0, -13.4704) -> (0, 0)
  line L20 (4.4901, 0) -> (0, 0)
  dimension "d35" = 6.35
  dimension "d36" = 3.175
  dimension "d39" = 12.7
  dimension "d40" = 12.7
extrude "Extrusion6" add sketch "Sketch4" against normal blind 3.175 contours L0 L1 L14 L6 L12 | L6 L14 L10 L12 | L1 L2 L11 L5 L13 | L5 L11 A56 L7 L13 | L11 A56 picked at (-40.1488, -99.8322)
sketch "Sketch5" plane through (0, 0, 0) normal (0, -1, 0) x (1, 0, 0)
  line L0 (4.4901, 0) -> (114.3, 0) projected
  line L1 (114.3, 0) -> (114.3, 50.8) projected
  line L2 (114.3, 50.8) -> (8.9803, 50.8) projected
  arc A0 (82.793, 0) -> (82.793, 50.8) centre (99.06, 25.4) ccw
  point P0 (0, 0)
  dimension "d47" = 60.325
extrude "Extrusion7" add sketch "Sketch5" against normal blind 3.175
sketch "Sketch6" plane through (0, 0, 0) normal (0, -1, 0) x (1, 0, 0)
  circle A0 centre (101.6, 0) radius 1.9812
  circle A1 centre (127, 25.4) radius 1.9812
  circle A2 centre (101.6, 50.8) radius 1.9812
  point P0 (0, 0)
sketch "Sketch7" plane through (0, 3.175, 0) normal (0, 1, 0) x (1, 0, 0)
  circle A0 centre (124.46, -25.4) radius 2.032 projected
  circle A1 centre (107.95, -6.35) radius 3.3782 projected
  circle A2 centre (107.95, -44.45) radius 3.3782 projected
  line L0 (114.3, -50.8) -> (153.5256, -38.1) projected
  line L1 (153.5256, -38.1) -> (119.1028, -115.2026) projected
  line L2 (119.1028, -115.2026) -> (114.3, -50.8) projected
  line L3 (153.5256, -12.7) -> (114.3, 0) projected
  line L4 (114.3, 0) -> (119.1028, 64.4026) projected
  line L5 (119.1028, 64.4026) -> (153.5256, -12.7) projected
  circle A3 centre (107.95, -44.45) radius 3.3782 projected
  circle A4 centre (107.95, -6.35) radius 3.3782 projected
  circle A5 centre (119.1028, -124.1828) radius 3.3782 projected
  circle A6 centre (159.8756, -19.05) radius 3.3782 projected
  circle A7 centre (159.8756, -31.75) radius 3.3782 projected
  circle A8 centre (119.1028, 73.3828) radius 3.3782 projected
  line L6 (101.6, -50.8) -> (110.1226, -124.1828) projected
  line L7 (110.1226, -124.1828) -> (119.1028, -133.1631) projected
  line L8 (119.1028, -133.1631) -> (128.0831, -124.1828) projected
  line L9 (128.0831, -124.1828) -> (166.2256, -38.1) projected
  line L10 (166.2256, -38.1) -> (166.2256, -12.7) projected
  line L11 (166.2256, -12.7) -> (128.0831, 73.3828) projected
  line L12 (128.0831, 73.3828) -> (119.1028, 82.3631) projected
  line L13 (119.1028, 82.3631) -> (110.1226, 73.3828) projected
  line L14 (110.1226, 73.3828) -> (101.6, 0) projected
  line L15 (101.6, 0) -> (101.6, -9.7295) projected
  arc A9 (101.6, -41.0705) -> (101.6, -9.7295) centre (99.06, -25.4) ccw projected
  line L16 (101.6, -41.0705) -> (101.6, -50.8) projected
  point P0 (0, 0)
extrude "Extrusion9" add sketch "Sketch7" against normal blind 3.175
extrude "Extrusion10" cut sketch "Sketch6" against normal blind 25.4
properties part number "Bearing Plate"
